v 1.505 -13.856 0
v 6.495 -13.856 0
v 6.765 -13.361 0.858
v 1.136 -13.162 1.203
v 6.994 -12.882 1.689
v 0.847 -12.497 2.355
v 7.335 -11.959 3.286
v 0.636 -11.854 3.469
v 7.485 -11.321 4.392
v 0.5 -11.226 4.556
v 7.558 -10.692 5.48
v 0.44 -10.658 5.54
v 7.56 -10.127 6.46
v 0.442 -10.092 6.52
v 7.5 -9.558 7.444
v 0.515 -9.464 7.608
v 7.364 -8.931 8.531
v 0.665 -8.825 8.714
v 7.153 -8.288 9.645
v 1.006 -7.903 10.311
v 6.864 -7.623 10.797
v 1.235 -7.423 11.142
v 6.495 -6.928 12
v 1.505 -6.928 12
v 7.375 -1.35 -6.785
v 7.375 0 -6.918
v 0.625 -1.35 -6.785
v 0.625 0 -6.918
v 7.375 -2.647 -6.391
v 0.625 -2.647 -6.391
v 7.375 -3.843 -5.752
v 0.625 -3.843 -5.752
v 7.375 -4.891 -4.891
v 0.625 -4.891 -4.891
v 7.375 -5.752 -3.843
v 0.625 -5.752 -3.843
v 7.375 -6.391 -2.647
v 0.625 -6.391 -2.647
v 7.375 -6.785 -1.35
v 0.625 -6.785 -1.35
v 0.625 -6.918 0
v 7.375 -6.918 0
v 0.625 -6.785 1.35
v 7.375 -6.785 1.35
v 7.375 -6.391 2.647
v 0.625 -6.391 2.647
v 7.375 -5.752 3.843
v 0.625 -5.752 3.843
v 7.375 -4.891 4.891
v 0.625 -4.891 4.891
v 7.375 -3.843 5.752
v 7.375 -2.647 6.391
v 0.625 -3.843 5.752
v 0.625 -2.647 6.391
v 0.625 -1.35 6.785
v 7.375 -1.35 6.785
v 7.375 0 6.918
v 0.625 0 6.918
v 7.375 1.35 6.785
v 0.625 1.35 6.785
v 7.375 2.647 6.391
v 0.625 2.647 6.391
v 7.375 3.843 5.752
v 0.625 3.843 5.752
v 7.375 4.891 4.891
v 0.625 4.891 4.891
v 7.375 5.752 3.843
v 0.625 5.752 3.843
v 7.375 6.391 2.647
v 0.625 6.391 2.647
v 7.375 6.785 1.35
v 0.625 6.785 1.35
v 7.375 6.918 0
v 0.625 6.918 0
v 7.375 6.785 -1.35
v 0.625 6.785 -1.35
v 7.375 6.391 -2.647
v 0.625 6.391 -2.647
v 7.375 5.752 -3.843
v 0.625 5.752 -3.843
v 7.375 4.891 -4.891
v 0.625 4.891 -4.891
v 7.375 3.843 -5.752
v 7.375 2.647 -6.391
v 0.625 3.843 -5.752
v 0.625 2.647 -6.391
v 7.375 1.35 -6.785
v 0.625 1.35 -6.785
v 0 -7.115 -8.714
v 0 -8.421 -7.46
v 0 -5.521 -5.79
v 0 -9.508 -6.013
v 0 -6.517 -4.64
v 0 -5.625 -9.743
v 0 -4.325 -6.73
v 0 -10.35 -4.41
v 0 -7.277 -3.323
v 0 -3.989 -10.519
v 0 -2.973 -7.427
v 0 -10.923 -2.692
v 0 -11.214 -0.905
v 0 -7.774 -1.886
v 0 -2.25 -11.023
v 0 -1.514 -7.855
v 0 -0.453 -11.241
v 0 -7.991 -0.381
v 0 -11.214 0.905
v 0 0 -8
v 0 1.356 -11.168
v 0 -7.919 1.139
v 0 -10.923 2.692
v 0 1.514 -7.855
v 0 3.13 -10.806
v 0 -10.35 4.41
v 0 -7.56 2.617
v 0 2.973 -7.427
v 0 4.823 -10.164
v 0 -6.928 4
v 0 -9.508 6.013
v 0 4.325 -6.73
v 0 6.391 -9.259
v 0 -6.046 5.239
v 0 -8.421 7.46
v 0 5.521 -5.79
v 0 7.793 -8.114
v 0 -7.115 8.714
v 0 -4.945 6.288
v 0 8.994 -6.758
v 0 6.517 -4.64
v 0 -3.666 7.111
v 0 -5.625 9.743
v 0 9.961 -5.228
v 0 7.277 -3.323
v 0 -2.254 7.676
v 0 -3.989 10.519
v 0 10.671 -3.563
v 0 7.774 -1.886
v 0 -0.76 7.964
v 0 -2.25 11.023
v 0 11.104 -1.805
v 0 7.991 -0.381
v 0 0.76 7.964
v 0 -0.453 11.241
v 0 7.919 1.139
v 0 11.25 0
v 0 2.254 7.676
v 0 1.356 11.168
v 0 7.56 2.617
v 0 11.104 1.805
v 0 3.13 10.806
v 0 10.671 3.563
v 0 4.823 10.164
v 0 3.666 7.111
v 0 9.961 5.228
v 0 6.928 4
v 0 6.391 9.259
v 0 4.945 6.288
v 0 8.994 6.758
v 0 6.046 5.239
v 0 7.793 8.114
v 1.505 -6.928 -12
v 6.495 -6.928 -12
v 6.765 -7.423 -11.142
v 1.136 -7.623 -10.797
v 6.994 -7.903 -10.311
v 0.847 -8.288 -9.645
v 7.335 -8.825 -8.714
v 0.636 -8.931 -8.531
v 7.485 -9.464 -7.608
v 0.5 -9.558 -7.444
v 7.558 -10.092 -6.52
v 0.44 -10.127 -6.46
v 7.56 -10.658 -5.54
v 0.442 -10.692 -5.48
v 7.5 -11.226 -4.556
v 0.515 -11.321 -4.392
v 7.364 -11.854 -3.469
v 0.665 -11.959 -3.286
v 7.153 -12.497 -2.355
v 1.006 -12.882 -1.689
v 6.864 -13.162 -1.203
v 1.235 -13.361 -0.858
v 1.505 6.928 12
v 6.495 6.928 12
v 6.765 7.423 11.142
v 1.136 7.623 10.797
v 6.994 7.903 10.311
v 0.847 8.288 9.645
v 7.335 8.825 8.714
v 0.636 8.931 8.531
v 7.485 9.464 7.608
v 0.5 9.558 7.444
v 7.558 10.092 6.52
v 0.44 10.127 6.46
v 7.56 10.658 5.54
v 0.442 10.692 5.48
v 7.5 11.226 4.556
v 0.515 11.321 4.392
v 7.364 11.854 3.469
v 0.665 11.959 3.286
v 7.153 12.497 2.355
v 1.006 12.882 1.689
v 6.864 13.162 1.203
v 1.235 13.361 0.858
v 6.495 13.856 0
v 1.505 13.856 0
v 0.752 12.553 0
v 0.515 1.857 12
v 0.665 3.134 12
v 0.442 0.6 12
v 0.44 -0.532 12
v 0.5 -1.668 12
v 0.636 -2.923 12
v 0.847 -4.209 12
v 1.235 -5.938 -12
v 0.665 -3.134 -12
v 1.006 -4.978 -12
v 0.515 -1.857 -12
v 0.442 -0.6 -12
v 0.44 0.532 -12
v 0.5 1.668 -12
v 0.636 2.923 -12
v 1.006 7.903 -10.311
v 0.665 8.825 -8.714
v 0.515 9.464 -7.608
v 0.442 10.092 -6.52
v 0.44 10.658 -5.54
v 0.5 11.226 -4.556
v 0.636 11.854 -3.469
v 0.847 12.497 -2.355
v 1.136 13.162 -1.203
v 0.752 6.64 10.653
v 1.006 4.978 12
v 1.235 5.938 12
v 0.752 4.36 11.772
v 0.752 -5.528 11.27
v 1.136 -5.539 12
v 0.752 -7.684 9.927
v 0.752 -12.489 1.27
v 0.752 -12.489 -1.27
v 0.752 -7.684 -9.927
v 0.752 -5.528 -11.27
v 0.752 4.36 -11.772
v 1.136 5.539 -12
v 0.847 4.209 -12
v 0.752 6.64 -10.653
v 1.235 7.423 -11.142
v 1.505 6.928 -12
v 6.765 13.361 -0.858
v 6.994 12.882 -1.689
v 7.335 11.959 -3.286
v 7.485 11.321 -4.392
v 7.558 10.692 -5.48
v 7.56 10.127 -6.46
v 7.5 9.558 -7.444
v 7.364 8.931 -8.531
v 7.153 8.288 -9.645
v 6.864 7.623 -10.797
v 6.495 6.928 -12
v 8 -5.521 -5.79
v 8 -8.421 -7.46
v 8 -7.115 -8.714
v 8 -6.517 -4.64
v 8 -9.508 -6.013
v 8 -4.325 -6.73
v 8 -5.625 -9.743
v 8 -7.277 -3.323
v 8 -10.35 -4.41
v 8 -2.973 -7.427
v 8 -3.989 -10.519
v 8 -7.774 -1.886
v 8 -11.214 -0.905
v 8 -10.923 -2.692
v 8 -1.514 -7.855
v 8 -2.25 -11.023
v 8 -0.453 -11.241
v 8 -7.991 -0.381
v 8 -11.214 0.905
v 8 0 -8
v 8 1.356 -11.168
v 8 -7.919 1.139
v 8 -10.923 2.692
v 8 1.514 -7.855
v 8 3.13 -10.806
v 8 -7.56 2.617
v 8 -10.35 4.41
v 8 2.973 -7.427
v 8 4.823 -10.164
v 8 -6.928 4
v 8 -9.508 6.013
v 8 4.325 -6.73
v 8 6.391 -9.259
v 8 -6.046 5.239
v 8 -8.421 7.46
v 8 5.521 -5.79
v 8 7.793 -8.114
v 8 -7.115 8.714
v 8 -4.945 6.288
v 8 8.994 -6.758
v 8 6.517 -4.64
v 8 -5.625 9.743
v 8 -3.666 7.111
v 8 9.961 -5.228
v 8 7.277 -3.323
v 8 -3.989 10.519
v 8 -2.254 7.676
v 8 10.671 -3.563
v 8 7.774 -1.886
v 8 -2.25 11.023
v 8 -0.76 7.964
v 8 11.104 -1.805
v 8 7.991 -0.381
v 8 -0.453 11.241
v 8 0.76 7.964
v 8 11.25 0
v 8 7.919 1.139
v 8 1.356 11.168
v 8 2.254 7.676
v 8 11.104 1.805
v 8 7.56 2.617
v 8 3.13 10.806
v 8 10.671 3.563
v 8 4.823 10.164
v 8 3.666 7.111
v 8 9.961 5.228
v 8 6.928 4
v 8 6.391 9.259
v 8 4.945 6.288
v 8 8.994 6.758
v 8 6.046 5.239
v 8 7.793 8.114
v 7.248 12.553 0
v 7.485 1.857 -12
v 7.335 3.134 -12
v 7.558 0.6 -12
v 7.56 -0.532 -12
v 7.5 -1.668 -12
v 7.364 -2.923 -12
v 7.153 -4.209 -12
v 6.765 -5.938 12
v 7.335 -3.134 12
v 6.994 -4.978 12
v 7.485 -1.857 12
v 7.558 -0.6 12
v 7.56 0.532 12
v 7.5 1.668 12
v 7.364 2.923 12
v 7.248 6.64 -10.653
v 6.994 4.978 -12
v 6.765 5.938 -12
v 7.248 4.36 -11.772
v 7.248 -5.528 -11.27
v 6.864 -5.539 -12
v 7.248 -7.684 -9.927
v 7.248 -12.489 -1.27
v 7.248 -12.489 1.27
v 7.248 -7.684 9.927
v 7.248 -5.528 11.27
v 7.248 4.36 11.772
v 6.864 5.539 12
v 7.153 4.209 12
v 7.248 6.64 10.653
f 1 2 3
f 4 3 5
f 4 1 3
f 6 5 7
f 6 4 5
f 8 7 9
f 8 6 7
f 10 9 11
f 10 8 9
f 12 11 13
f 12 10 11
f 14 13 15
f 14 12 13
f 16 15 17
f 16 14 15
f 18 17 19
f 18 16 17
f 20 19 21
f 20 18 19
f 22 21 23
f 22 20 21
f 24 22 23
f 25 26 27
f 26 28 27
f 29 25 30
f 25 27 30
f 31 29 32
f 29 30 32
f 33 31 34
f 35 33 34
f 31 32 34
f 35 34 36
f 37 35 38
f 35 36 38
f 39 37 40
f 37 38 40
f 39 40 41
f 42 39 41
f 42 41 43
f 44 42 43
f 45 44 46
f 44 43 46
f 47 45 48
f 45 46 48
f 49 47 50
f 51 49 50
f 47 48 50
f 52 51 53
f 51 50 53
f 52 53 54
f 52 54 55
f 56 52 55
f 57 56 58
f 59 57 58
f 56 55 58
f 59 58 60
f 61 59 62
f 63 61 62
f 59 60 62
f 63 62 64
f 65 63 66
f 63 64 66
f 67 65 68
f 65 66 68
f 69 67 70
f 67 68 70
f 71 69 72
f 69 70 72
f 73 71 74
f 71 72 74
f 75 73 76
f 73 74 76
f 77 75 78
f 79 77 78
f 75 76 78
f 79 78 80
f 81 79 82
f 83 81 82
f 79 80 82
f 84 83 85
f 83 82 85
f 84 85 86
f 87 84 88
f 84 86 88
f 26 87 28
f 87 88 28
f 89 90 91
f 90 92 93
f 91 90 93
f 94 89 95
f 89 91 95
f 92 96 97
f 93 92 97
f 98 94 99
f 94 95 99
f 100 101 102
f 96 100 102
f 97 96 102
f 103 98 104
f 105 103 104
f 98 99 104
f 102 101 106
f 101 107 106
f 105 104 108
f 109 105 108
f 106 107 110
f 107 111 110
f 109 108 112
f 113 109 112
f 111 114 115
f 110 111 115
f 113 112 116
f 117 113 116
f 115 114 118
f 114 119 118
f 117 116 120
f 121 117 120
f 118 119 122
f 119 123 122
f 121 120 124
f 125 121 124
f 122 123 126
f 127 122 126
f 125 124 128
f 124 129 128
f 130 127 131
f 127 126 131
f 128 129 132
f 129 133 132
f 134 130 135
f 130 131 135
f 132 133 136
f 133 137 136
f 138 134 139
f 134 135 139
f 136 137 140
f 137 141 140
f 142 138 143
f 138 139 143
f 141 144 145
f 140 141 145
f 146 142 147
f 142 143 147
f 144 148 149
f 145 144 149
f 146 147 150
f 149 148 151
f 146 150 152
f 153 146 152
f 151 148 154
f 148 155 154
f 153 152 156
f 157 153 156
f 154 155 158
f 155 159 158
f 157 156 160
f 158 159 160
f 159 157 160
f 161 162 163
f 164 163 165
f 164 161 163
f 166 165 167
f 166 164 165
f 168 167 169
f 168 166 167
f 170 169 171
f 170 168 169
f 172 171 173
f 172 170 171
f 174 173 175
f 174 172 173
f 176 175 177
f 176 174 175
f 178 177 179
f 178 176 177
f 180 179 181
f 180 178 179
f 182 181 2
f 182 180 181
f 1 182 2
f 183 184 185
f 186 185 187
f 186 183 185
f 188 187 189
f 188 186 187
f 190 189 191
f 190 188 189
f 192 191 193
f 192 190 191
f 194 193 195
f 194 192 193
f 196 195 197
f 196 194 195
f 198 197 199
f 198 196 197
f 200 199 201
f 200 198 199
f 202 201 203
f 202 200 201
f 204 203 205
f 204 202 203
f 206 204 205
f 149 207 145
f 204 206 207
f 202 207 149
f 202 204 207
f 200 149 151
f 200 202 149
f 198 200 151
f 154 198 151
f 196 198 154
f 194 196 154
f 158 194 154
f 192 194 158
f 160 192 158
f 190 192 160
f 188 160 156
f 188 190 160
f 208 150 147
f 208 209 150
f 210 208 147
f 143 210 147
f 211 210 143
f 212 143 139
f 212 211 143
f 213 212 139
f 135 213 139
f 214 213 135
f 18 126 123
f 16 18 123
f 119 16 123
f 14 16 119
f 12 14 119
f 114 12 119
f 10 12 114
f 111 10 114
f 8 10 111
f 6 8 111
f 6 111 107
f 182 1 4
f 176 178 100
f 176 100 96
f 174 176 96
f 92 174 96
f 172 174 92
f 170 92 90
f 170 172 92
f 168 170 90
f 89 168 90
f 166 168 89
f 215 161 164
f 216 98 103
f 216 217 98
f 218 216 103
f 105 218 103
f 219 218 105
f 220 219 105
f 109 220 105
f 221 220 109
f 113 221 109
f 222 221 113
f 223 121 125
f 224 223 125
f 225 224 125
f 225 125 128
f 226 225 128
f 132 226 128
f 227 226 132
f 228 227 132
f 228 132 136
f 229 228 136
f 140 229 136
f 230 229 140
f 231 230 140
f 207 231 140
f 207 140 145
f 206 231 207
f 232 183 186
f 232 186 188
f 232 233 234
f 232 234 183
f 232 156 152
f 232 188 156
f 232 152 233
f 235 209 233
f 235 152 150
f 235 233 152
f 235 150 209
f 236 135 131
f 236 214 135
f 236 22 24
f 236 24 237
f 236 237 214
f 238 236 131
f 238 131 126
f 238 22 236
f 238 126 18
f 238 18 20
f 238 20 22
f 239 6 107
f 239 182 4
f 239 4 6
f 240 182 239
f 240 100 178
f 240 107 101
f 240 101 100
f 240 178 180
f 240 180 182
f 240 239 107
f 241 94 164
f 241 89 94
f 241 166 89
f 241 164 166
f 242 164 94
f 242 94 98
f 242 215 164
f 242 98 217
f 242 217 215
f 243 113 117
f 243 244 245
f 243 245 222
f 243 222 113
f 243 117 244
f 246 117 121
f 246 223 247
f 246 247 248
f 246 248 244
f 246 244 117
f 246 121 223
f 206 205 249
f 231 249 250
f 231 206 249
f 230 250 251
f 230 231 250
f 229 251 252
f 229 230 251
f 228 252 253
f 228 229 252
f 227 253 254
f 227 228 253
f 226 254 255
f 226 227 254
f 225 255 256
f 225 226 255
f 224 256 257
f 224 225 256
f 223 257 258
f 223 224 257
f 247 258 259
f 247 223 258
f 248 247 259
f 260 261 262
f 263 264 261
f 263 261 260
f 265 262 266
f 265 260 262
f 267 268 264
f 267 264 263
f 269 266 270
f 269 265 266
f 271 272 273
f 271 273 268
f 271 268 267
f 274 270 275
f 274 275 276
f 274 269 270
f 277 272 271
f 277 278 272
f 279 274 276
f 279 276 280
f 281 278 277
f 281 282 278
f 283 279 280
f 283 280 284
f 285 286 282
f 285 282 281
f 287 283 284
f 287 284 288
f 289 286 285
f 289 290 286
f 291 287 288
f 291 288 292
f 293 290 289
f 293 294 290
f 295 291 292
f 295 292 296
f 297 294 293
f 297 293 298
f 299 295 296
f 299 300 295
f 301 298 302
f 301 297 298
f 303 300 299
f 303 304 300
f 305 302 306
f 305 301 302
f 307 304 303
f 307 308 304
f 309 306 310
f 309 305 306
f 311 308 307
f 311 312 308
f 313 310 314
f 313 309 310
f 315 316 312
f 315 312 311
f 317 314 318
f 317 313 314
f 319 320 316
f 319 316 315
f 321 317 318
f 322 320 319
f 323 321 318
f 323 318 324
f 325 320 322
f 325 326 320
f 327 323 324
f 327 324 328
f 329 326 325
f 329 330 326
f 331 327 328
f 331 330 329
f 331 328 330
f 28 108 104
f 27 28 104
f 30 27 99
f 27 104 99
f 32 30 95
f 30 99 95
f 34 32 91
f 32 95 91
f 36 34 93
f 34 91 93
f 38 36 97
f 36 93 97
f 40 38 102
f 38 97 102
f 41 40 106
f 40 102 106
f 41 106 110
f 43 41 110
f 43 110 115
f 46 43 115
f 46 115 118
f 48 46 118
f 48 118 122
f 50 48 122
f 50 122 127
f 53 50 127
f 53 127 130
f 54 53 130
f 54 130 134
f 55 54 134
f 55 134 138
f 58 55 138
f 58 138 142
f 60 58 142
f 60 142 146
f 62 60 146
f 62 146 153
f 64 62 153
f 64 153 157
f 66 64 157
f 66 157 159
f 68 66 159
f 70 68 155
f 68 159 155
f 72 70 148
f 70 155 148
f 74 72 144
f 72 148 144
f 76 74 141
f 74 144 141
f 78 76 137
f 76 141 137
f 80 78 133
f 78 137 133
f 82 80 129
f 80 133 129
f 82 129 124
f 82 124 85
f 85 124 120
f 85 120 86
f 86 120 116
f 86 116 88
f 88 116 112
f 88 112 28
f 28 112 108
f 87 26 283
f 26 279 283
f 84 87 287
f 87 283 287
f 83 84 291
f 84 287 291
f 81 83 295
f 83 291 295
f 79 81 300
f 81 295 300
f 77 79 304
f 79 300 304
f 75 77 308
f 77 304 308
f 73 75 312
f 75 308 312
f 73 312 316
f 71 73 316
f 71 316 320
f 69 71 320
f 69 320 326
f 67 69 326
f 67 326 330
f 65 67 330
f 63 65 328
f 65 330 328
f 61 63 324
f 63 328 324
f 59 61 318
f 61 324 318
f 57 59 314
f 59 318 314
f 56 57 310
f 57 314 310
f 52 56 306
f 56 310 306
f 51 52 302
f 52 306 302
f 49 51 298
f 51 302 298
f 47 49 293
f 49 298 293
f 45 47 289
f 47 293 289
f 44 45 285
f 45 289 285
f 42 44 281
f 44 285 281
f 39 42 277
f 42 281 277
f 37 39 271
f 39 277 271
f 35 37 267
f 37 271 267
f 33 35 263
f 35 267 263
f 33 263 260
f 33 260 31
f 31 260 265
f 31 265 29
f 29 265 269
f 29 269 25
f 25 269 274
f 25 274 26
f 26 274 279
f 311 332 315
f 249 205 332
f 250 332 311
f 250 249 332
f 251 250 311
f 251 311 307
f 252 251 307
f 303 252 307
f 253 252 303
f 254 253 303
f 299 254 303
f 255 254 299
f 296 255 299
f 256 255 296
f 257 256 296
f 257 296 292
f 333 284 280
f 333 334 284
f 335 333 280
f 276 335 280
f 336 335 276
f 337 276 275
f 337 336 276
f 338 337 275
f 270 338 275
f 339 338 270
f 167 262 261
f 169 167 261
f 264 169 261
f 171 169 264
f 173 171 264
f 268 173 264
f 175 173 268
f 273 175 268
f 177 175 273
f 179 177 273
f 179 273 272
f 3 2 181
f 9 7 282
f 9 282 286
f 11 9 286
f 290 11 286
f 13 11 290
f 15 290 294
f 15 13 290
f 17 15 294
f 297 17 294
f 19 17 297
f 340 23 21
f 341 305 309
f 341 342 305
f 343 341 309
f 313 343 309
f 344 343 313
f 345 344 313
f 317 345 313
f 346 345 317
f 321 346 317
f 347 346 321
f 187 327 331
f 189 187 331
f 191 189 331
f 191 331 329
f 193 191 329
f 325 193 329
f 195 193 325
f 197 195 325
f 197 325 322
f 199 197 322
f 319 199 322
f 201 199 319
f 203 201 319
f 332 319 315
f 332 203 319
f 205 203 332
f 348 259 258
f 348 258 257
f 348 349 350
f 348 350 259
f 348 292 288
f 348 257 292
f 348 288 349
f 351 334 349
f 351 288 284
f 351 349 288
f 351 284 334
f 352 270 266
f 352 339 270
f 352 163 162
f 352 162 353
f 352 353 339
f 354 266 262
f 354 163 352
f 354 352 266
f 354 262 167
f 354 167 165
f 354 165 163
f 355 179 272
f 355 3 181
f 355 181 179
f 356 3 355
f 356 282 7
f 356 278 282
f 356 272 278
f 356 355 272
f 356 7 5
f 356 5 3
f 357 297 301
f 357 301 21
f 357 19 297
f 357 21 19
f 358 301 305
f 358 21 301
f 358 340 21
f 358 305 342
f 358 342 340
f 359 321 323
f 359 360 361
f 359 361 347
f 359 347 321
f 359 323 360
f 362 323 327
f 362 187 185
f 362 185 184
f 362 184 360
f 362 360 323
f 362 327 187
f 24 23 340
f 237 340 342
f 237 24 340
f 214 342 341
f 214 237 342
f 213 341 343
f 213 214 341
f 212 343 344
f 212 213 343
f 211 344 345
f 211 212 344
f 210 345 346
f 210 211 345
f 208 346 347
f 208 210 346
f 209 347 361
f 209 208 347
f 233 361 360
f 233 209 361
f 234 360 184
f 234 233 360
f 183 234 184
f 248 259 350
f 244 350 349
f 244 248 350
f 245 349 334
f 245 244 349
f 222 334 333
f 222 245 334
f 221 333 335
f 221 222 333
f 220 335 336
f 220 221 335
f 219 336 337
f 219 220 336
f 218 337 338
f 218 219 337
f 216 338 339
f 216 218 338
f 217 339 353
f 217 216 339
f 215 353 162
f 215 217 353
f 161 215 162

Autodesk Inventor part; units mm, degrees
ref_plane "YZ Plane" through (0, 0, 0) normal (1, 0, 0) x (0, 1, 0)
ref_plane "XZ Plane" through (0, 0, 0) normal (0, 1, 0) x (-1, 0, 0)
sketch "Эскиз1" plane through (0, 0, 0) normal (1, 0, 0) x (0, 1, 0)
  line L0 (-13.8564, 0) -> (-6.9282, 12)
  line L1 (-6.9282, 12) -> (6.9282, 12)
  line L2 (6.9282, 12) -> (13.8564, 0)
  line L3 (13.8564, 0) -> (6.9282, -12)
  line L4 (6.9282, -12) -> (-6.9282, -12)
  line L5 (-6.9282, -12) -> (-13.8564, 0)
  point P0 (0, 0)
  point P1 (0, 0)
  dimension "d0" = 27.7128
extrude "Базовый элемент" add sketch "Эскиз1" along normal blind 8
sketch "Эскиз2" plane through (0, 0, 0) normal (0, 0, 1) x (1, 0, 0)
  line L0 (0, 6.9282) -> (0, 13.8564) projected
  line L1 (0, 13.8564) -> (8, 13.8564) projected
  line L2 (8, 6.9282) -> (8, 13.8564) projected
  line L3 (-1.6, 0) -> (9.6, 0) projected
  line L4 (1.5048, 13.8564) -> (0, 11.25)
  line L5 (6.4952, 13.8564) -> (8, 11.25)
  dimension "d3" = 30
  dimension "d4" = 30
  dimension "d5" = 22.5
  dimension "d6" = 22.5
revolve "Фаска1" cut sketch "Эскиз2" angle 360 about axis through (-10, 0, 0) along (1, 0, 0)
sketch "Эскиз3" plane through (8, 0, 0) normal (1, 0, 0) x (0, 0, -1)
  arc A0 (-0.625, -1.0825) -> (0.625, -1.0825) centre (0, 0) ccw projected
hole "Резьба" at (8, 0, 0) direction (-1, 0, 0) diameter 13.835 end through all thread size "M16x2" class "6H" standard "ISO Metric profile"
chamfer "Фаска2" distance 1.0825 angle 30 1 edges at (8, 0, 6.9175) measured on face at (8, 9.6801, -1.1754)
chamfer "Фаска3" distance 1.0825 angle 30 1 edges at (0, 0, 6.9175) measured on face at (0, 9.6801, -1.1754)
ref_plane "Work Plane1" through (-29.7469, 0, 0) normal (0, -0.866, -0.5) x (1, 0, 0)
equation "\"d0\" = 1.1547 * SW"
equation "\"d1\" = KOH"
equation "\"d3\" = ANG1"
equation "\"d4\" = ANG2"
equation "\"d5\" = SW0"
equation "\"d6\" = SW01"
equation "\"d8\" = -0.5 * GD1 + 0.5 * NND"
equation "\"d40\" = -0.5 * GD1 + 0.5 * NND"
equation "\"d10\" = -0.5 * GD1 + 0.5 * NND"
equation "\"d41\" = -0.5 * GD1 + 0.5 * NND"
equation "\"ANG1\" = 30deg"
equation "\"ANG2\" = 30deg"
equation "\"NND\" = 16"
equation "\"KOH\" = 8"
equation "\"SW\" = 24"
equation "\"SW0\" = 22.5"
equation "\"SW01\" = SW0"
equation "\"GUL\" = 0.541266 * PTC"
equation "\"LADI\" = 0"
equation "\"TOA\" = 30deg"
equation "\"FAWI\" = 30deg"
equation "\"PTC\" = 2"
equation "\"THREADDIA\" = 16"
equation "\"E0\" = 1.155 * SW"
equation "\"GAL\" = 0.541266 * PTC"
equation "\"GD1\" = 13.834936"
properties part number "M16-6H ГОСТ 4035-2014" material "Сталь, мягкая"
